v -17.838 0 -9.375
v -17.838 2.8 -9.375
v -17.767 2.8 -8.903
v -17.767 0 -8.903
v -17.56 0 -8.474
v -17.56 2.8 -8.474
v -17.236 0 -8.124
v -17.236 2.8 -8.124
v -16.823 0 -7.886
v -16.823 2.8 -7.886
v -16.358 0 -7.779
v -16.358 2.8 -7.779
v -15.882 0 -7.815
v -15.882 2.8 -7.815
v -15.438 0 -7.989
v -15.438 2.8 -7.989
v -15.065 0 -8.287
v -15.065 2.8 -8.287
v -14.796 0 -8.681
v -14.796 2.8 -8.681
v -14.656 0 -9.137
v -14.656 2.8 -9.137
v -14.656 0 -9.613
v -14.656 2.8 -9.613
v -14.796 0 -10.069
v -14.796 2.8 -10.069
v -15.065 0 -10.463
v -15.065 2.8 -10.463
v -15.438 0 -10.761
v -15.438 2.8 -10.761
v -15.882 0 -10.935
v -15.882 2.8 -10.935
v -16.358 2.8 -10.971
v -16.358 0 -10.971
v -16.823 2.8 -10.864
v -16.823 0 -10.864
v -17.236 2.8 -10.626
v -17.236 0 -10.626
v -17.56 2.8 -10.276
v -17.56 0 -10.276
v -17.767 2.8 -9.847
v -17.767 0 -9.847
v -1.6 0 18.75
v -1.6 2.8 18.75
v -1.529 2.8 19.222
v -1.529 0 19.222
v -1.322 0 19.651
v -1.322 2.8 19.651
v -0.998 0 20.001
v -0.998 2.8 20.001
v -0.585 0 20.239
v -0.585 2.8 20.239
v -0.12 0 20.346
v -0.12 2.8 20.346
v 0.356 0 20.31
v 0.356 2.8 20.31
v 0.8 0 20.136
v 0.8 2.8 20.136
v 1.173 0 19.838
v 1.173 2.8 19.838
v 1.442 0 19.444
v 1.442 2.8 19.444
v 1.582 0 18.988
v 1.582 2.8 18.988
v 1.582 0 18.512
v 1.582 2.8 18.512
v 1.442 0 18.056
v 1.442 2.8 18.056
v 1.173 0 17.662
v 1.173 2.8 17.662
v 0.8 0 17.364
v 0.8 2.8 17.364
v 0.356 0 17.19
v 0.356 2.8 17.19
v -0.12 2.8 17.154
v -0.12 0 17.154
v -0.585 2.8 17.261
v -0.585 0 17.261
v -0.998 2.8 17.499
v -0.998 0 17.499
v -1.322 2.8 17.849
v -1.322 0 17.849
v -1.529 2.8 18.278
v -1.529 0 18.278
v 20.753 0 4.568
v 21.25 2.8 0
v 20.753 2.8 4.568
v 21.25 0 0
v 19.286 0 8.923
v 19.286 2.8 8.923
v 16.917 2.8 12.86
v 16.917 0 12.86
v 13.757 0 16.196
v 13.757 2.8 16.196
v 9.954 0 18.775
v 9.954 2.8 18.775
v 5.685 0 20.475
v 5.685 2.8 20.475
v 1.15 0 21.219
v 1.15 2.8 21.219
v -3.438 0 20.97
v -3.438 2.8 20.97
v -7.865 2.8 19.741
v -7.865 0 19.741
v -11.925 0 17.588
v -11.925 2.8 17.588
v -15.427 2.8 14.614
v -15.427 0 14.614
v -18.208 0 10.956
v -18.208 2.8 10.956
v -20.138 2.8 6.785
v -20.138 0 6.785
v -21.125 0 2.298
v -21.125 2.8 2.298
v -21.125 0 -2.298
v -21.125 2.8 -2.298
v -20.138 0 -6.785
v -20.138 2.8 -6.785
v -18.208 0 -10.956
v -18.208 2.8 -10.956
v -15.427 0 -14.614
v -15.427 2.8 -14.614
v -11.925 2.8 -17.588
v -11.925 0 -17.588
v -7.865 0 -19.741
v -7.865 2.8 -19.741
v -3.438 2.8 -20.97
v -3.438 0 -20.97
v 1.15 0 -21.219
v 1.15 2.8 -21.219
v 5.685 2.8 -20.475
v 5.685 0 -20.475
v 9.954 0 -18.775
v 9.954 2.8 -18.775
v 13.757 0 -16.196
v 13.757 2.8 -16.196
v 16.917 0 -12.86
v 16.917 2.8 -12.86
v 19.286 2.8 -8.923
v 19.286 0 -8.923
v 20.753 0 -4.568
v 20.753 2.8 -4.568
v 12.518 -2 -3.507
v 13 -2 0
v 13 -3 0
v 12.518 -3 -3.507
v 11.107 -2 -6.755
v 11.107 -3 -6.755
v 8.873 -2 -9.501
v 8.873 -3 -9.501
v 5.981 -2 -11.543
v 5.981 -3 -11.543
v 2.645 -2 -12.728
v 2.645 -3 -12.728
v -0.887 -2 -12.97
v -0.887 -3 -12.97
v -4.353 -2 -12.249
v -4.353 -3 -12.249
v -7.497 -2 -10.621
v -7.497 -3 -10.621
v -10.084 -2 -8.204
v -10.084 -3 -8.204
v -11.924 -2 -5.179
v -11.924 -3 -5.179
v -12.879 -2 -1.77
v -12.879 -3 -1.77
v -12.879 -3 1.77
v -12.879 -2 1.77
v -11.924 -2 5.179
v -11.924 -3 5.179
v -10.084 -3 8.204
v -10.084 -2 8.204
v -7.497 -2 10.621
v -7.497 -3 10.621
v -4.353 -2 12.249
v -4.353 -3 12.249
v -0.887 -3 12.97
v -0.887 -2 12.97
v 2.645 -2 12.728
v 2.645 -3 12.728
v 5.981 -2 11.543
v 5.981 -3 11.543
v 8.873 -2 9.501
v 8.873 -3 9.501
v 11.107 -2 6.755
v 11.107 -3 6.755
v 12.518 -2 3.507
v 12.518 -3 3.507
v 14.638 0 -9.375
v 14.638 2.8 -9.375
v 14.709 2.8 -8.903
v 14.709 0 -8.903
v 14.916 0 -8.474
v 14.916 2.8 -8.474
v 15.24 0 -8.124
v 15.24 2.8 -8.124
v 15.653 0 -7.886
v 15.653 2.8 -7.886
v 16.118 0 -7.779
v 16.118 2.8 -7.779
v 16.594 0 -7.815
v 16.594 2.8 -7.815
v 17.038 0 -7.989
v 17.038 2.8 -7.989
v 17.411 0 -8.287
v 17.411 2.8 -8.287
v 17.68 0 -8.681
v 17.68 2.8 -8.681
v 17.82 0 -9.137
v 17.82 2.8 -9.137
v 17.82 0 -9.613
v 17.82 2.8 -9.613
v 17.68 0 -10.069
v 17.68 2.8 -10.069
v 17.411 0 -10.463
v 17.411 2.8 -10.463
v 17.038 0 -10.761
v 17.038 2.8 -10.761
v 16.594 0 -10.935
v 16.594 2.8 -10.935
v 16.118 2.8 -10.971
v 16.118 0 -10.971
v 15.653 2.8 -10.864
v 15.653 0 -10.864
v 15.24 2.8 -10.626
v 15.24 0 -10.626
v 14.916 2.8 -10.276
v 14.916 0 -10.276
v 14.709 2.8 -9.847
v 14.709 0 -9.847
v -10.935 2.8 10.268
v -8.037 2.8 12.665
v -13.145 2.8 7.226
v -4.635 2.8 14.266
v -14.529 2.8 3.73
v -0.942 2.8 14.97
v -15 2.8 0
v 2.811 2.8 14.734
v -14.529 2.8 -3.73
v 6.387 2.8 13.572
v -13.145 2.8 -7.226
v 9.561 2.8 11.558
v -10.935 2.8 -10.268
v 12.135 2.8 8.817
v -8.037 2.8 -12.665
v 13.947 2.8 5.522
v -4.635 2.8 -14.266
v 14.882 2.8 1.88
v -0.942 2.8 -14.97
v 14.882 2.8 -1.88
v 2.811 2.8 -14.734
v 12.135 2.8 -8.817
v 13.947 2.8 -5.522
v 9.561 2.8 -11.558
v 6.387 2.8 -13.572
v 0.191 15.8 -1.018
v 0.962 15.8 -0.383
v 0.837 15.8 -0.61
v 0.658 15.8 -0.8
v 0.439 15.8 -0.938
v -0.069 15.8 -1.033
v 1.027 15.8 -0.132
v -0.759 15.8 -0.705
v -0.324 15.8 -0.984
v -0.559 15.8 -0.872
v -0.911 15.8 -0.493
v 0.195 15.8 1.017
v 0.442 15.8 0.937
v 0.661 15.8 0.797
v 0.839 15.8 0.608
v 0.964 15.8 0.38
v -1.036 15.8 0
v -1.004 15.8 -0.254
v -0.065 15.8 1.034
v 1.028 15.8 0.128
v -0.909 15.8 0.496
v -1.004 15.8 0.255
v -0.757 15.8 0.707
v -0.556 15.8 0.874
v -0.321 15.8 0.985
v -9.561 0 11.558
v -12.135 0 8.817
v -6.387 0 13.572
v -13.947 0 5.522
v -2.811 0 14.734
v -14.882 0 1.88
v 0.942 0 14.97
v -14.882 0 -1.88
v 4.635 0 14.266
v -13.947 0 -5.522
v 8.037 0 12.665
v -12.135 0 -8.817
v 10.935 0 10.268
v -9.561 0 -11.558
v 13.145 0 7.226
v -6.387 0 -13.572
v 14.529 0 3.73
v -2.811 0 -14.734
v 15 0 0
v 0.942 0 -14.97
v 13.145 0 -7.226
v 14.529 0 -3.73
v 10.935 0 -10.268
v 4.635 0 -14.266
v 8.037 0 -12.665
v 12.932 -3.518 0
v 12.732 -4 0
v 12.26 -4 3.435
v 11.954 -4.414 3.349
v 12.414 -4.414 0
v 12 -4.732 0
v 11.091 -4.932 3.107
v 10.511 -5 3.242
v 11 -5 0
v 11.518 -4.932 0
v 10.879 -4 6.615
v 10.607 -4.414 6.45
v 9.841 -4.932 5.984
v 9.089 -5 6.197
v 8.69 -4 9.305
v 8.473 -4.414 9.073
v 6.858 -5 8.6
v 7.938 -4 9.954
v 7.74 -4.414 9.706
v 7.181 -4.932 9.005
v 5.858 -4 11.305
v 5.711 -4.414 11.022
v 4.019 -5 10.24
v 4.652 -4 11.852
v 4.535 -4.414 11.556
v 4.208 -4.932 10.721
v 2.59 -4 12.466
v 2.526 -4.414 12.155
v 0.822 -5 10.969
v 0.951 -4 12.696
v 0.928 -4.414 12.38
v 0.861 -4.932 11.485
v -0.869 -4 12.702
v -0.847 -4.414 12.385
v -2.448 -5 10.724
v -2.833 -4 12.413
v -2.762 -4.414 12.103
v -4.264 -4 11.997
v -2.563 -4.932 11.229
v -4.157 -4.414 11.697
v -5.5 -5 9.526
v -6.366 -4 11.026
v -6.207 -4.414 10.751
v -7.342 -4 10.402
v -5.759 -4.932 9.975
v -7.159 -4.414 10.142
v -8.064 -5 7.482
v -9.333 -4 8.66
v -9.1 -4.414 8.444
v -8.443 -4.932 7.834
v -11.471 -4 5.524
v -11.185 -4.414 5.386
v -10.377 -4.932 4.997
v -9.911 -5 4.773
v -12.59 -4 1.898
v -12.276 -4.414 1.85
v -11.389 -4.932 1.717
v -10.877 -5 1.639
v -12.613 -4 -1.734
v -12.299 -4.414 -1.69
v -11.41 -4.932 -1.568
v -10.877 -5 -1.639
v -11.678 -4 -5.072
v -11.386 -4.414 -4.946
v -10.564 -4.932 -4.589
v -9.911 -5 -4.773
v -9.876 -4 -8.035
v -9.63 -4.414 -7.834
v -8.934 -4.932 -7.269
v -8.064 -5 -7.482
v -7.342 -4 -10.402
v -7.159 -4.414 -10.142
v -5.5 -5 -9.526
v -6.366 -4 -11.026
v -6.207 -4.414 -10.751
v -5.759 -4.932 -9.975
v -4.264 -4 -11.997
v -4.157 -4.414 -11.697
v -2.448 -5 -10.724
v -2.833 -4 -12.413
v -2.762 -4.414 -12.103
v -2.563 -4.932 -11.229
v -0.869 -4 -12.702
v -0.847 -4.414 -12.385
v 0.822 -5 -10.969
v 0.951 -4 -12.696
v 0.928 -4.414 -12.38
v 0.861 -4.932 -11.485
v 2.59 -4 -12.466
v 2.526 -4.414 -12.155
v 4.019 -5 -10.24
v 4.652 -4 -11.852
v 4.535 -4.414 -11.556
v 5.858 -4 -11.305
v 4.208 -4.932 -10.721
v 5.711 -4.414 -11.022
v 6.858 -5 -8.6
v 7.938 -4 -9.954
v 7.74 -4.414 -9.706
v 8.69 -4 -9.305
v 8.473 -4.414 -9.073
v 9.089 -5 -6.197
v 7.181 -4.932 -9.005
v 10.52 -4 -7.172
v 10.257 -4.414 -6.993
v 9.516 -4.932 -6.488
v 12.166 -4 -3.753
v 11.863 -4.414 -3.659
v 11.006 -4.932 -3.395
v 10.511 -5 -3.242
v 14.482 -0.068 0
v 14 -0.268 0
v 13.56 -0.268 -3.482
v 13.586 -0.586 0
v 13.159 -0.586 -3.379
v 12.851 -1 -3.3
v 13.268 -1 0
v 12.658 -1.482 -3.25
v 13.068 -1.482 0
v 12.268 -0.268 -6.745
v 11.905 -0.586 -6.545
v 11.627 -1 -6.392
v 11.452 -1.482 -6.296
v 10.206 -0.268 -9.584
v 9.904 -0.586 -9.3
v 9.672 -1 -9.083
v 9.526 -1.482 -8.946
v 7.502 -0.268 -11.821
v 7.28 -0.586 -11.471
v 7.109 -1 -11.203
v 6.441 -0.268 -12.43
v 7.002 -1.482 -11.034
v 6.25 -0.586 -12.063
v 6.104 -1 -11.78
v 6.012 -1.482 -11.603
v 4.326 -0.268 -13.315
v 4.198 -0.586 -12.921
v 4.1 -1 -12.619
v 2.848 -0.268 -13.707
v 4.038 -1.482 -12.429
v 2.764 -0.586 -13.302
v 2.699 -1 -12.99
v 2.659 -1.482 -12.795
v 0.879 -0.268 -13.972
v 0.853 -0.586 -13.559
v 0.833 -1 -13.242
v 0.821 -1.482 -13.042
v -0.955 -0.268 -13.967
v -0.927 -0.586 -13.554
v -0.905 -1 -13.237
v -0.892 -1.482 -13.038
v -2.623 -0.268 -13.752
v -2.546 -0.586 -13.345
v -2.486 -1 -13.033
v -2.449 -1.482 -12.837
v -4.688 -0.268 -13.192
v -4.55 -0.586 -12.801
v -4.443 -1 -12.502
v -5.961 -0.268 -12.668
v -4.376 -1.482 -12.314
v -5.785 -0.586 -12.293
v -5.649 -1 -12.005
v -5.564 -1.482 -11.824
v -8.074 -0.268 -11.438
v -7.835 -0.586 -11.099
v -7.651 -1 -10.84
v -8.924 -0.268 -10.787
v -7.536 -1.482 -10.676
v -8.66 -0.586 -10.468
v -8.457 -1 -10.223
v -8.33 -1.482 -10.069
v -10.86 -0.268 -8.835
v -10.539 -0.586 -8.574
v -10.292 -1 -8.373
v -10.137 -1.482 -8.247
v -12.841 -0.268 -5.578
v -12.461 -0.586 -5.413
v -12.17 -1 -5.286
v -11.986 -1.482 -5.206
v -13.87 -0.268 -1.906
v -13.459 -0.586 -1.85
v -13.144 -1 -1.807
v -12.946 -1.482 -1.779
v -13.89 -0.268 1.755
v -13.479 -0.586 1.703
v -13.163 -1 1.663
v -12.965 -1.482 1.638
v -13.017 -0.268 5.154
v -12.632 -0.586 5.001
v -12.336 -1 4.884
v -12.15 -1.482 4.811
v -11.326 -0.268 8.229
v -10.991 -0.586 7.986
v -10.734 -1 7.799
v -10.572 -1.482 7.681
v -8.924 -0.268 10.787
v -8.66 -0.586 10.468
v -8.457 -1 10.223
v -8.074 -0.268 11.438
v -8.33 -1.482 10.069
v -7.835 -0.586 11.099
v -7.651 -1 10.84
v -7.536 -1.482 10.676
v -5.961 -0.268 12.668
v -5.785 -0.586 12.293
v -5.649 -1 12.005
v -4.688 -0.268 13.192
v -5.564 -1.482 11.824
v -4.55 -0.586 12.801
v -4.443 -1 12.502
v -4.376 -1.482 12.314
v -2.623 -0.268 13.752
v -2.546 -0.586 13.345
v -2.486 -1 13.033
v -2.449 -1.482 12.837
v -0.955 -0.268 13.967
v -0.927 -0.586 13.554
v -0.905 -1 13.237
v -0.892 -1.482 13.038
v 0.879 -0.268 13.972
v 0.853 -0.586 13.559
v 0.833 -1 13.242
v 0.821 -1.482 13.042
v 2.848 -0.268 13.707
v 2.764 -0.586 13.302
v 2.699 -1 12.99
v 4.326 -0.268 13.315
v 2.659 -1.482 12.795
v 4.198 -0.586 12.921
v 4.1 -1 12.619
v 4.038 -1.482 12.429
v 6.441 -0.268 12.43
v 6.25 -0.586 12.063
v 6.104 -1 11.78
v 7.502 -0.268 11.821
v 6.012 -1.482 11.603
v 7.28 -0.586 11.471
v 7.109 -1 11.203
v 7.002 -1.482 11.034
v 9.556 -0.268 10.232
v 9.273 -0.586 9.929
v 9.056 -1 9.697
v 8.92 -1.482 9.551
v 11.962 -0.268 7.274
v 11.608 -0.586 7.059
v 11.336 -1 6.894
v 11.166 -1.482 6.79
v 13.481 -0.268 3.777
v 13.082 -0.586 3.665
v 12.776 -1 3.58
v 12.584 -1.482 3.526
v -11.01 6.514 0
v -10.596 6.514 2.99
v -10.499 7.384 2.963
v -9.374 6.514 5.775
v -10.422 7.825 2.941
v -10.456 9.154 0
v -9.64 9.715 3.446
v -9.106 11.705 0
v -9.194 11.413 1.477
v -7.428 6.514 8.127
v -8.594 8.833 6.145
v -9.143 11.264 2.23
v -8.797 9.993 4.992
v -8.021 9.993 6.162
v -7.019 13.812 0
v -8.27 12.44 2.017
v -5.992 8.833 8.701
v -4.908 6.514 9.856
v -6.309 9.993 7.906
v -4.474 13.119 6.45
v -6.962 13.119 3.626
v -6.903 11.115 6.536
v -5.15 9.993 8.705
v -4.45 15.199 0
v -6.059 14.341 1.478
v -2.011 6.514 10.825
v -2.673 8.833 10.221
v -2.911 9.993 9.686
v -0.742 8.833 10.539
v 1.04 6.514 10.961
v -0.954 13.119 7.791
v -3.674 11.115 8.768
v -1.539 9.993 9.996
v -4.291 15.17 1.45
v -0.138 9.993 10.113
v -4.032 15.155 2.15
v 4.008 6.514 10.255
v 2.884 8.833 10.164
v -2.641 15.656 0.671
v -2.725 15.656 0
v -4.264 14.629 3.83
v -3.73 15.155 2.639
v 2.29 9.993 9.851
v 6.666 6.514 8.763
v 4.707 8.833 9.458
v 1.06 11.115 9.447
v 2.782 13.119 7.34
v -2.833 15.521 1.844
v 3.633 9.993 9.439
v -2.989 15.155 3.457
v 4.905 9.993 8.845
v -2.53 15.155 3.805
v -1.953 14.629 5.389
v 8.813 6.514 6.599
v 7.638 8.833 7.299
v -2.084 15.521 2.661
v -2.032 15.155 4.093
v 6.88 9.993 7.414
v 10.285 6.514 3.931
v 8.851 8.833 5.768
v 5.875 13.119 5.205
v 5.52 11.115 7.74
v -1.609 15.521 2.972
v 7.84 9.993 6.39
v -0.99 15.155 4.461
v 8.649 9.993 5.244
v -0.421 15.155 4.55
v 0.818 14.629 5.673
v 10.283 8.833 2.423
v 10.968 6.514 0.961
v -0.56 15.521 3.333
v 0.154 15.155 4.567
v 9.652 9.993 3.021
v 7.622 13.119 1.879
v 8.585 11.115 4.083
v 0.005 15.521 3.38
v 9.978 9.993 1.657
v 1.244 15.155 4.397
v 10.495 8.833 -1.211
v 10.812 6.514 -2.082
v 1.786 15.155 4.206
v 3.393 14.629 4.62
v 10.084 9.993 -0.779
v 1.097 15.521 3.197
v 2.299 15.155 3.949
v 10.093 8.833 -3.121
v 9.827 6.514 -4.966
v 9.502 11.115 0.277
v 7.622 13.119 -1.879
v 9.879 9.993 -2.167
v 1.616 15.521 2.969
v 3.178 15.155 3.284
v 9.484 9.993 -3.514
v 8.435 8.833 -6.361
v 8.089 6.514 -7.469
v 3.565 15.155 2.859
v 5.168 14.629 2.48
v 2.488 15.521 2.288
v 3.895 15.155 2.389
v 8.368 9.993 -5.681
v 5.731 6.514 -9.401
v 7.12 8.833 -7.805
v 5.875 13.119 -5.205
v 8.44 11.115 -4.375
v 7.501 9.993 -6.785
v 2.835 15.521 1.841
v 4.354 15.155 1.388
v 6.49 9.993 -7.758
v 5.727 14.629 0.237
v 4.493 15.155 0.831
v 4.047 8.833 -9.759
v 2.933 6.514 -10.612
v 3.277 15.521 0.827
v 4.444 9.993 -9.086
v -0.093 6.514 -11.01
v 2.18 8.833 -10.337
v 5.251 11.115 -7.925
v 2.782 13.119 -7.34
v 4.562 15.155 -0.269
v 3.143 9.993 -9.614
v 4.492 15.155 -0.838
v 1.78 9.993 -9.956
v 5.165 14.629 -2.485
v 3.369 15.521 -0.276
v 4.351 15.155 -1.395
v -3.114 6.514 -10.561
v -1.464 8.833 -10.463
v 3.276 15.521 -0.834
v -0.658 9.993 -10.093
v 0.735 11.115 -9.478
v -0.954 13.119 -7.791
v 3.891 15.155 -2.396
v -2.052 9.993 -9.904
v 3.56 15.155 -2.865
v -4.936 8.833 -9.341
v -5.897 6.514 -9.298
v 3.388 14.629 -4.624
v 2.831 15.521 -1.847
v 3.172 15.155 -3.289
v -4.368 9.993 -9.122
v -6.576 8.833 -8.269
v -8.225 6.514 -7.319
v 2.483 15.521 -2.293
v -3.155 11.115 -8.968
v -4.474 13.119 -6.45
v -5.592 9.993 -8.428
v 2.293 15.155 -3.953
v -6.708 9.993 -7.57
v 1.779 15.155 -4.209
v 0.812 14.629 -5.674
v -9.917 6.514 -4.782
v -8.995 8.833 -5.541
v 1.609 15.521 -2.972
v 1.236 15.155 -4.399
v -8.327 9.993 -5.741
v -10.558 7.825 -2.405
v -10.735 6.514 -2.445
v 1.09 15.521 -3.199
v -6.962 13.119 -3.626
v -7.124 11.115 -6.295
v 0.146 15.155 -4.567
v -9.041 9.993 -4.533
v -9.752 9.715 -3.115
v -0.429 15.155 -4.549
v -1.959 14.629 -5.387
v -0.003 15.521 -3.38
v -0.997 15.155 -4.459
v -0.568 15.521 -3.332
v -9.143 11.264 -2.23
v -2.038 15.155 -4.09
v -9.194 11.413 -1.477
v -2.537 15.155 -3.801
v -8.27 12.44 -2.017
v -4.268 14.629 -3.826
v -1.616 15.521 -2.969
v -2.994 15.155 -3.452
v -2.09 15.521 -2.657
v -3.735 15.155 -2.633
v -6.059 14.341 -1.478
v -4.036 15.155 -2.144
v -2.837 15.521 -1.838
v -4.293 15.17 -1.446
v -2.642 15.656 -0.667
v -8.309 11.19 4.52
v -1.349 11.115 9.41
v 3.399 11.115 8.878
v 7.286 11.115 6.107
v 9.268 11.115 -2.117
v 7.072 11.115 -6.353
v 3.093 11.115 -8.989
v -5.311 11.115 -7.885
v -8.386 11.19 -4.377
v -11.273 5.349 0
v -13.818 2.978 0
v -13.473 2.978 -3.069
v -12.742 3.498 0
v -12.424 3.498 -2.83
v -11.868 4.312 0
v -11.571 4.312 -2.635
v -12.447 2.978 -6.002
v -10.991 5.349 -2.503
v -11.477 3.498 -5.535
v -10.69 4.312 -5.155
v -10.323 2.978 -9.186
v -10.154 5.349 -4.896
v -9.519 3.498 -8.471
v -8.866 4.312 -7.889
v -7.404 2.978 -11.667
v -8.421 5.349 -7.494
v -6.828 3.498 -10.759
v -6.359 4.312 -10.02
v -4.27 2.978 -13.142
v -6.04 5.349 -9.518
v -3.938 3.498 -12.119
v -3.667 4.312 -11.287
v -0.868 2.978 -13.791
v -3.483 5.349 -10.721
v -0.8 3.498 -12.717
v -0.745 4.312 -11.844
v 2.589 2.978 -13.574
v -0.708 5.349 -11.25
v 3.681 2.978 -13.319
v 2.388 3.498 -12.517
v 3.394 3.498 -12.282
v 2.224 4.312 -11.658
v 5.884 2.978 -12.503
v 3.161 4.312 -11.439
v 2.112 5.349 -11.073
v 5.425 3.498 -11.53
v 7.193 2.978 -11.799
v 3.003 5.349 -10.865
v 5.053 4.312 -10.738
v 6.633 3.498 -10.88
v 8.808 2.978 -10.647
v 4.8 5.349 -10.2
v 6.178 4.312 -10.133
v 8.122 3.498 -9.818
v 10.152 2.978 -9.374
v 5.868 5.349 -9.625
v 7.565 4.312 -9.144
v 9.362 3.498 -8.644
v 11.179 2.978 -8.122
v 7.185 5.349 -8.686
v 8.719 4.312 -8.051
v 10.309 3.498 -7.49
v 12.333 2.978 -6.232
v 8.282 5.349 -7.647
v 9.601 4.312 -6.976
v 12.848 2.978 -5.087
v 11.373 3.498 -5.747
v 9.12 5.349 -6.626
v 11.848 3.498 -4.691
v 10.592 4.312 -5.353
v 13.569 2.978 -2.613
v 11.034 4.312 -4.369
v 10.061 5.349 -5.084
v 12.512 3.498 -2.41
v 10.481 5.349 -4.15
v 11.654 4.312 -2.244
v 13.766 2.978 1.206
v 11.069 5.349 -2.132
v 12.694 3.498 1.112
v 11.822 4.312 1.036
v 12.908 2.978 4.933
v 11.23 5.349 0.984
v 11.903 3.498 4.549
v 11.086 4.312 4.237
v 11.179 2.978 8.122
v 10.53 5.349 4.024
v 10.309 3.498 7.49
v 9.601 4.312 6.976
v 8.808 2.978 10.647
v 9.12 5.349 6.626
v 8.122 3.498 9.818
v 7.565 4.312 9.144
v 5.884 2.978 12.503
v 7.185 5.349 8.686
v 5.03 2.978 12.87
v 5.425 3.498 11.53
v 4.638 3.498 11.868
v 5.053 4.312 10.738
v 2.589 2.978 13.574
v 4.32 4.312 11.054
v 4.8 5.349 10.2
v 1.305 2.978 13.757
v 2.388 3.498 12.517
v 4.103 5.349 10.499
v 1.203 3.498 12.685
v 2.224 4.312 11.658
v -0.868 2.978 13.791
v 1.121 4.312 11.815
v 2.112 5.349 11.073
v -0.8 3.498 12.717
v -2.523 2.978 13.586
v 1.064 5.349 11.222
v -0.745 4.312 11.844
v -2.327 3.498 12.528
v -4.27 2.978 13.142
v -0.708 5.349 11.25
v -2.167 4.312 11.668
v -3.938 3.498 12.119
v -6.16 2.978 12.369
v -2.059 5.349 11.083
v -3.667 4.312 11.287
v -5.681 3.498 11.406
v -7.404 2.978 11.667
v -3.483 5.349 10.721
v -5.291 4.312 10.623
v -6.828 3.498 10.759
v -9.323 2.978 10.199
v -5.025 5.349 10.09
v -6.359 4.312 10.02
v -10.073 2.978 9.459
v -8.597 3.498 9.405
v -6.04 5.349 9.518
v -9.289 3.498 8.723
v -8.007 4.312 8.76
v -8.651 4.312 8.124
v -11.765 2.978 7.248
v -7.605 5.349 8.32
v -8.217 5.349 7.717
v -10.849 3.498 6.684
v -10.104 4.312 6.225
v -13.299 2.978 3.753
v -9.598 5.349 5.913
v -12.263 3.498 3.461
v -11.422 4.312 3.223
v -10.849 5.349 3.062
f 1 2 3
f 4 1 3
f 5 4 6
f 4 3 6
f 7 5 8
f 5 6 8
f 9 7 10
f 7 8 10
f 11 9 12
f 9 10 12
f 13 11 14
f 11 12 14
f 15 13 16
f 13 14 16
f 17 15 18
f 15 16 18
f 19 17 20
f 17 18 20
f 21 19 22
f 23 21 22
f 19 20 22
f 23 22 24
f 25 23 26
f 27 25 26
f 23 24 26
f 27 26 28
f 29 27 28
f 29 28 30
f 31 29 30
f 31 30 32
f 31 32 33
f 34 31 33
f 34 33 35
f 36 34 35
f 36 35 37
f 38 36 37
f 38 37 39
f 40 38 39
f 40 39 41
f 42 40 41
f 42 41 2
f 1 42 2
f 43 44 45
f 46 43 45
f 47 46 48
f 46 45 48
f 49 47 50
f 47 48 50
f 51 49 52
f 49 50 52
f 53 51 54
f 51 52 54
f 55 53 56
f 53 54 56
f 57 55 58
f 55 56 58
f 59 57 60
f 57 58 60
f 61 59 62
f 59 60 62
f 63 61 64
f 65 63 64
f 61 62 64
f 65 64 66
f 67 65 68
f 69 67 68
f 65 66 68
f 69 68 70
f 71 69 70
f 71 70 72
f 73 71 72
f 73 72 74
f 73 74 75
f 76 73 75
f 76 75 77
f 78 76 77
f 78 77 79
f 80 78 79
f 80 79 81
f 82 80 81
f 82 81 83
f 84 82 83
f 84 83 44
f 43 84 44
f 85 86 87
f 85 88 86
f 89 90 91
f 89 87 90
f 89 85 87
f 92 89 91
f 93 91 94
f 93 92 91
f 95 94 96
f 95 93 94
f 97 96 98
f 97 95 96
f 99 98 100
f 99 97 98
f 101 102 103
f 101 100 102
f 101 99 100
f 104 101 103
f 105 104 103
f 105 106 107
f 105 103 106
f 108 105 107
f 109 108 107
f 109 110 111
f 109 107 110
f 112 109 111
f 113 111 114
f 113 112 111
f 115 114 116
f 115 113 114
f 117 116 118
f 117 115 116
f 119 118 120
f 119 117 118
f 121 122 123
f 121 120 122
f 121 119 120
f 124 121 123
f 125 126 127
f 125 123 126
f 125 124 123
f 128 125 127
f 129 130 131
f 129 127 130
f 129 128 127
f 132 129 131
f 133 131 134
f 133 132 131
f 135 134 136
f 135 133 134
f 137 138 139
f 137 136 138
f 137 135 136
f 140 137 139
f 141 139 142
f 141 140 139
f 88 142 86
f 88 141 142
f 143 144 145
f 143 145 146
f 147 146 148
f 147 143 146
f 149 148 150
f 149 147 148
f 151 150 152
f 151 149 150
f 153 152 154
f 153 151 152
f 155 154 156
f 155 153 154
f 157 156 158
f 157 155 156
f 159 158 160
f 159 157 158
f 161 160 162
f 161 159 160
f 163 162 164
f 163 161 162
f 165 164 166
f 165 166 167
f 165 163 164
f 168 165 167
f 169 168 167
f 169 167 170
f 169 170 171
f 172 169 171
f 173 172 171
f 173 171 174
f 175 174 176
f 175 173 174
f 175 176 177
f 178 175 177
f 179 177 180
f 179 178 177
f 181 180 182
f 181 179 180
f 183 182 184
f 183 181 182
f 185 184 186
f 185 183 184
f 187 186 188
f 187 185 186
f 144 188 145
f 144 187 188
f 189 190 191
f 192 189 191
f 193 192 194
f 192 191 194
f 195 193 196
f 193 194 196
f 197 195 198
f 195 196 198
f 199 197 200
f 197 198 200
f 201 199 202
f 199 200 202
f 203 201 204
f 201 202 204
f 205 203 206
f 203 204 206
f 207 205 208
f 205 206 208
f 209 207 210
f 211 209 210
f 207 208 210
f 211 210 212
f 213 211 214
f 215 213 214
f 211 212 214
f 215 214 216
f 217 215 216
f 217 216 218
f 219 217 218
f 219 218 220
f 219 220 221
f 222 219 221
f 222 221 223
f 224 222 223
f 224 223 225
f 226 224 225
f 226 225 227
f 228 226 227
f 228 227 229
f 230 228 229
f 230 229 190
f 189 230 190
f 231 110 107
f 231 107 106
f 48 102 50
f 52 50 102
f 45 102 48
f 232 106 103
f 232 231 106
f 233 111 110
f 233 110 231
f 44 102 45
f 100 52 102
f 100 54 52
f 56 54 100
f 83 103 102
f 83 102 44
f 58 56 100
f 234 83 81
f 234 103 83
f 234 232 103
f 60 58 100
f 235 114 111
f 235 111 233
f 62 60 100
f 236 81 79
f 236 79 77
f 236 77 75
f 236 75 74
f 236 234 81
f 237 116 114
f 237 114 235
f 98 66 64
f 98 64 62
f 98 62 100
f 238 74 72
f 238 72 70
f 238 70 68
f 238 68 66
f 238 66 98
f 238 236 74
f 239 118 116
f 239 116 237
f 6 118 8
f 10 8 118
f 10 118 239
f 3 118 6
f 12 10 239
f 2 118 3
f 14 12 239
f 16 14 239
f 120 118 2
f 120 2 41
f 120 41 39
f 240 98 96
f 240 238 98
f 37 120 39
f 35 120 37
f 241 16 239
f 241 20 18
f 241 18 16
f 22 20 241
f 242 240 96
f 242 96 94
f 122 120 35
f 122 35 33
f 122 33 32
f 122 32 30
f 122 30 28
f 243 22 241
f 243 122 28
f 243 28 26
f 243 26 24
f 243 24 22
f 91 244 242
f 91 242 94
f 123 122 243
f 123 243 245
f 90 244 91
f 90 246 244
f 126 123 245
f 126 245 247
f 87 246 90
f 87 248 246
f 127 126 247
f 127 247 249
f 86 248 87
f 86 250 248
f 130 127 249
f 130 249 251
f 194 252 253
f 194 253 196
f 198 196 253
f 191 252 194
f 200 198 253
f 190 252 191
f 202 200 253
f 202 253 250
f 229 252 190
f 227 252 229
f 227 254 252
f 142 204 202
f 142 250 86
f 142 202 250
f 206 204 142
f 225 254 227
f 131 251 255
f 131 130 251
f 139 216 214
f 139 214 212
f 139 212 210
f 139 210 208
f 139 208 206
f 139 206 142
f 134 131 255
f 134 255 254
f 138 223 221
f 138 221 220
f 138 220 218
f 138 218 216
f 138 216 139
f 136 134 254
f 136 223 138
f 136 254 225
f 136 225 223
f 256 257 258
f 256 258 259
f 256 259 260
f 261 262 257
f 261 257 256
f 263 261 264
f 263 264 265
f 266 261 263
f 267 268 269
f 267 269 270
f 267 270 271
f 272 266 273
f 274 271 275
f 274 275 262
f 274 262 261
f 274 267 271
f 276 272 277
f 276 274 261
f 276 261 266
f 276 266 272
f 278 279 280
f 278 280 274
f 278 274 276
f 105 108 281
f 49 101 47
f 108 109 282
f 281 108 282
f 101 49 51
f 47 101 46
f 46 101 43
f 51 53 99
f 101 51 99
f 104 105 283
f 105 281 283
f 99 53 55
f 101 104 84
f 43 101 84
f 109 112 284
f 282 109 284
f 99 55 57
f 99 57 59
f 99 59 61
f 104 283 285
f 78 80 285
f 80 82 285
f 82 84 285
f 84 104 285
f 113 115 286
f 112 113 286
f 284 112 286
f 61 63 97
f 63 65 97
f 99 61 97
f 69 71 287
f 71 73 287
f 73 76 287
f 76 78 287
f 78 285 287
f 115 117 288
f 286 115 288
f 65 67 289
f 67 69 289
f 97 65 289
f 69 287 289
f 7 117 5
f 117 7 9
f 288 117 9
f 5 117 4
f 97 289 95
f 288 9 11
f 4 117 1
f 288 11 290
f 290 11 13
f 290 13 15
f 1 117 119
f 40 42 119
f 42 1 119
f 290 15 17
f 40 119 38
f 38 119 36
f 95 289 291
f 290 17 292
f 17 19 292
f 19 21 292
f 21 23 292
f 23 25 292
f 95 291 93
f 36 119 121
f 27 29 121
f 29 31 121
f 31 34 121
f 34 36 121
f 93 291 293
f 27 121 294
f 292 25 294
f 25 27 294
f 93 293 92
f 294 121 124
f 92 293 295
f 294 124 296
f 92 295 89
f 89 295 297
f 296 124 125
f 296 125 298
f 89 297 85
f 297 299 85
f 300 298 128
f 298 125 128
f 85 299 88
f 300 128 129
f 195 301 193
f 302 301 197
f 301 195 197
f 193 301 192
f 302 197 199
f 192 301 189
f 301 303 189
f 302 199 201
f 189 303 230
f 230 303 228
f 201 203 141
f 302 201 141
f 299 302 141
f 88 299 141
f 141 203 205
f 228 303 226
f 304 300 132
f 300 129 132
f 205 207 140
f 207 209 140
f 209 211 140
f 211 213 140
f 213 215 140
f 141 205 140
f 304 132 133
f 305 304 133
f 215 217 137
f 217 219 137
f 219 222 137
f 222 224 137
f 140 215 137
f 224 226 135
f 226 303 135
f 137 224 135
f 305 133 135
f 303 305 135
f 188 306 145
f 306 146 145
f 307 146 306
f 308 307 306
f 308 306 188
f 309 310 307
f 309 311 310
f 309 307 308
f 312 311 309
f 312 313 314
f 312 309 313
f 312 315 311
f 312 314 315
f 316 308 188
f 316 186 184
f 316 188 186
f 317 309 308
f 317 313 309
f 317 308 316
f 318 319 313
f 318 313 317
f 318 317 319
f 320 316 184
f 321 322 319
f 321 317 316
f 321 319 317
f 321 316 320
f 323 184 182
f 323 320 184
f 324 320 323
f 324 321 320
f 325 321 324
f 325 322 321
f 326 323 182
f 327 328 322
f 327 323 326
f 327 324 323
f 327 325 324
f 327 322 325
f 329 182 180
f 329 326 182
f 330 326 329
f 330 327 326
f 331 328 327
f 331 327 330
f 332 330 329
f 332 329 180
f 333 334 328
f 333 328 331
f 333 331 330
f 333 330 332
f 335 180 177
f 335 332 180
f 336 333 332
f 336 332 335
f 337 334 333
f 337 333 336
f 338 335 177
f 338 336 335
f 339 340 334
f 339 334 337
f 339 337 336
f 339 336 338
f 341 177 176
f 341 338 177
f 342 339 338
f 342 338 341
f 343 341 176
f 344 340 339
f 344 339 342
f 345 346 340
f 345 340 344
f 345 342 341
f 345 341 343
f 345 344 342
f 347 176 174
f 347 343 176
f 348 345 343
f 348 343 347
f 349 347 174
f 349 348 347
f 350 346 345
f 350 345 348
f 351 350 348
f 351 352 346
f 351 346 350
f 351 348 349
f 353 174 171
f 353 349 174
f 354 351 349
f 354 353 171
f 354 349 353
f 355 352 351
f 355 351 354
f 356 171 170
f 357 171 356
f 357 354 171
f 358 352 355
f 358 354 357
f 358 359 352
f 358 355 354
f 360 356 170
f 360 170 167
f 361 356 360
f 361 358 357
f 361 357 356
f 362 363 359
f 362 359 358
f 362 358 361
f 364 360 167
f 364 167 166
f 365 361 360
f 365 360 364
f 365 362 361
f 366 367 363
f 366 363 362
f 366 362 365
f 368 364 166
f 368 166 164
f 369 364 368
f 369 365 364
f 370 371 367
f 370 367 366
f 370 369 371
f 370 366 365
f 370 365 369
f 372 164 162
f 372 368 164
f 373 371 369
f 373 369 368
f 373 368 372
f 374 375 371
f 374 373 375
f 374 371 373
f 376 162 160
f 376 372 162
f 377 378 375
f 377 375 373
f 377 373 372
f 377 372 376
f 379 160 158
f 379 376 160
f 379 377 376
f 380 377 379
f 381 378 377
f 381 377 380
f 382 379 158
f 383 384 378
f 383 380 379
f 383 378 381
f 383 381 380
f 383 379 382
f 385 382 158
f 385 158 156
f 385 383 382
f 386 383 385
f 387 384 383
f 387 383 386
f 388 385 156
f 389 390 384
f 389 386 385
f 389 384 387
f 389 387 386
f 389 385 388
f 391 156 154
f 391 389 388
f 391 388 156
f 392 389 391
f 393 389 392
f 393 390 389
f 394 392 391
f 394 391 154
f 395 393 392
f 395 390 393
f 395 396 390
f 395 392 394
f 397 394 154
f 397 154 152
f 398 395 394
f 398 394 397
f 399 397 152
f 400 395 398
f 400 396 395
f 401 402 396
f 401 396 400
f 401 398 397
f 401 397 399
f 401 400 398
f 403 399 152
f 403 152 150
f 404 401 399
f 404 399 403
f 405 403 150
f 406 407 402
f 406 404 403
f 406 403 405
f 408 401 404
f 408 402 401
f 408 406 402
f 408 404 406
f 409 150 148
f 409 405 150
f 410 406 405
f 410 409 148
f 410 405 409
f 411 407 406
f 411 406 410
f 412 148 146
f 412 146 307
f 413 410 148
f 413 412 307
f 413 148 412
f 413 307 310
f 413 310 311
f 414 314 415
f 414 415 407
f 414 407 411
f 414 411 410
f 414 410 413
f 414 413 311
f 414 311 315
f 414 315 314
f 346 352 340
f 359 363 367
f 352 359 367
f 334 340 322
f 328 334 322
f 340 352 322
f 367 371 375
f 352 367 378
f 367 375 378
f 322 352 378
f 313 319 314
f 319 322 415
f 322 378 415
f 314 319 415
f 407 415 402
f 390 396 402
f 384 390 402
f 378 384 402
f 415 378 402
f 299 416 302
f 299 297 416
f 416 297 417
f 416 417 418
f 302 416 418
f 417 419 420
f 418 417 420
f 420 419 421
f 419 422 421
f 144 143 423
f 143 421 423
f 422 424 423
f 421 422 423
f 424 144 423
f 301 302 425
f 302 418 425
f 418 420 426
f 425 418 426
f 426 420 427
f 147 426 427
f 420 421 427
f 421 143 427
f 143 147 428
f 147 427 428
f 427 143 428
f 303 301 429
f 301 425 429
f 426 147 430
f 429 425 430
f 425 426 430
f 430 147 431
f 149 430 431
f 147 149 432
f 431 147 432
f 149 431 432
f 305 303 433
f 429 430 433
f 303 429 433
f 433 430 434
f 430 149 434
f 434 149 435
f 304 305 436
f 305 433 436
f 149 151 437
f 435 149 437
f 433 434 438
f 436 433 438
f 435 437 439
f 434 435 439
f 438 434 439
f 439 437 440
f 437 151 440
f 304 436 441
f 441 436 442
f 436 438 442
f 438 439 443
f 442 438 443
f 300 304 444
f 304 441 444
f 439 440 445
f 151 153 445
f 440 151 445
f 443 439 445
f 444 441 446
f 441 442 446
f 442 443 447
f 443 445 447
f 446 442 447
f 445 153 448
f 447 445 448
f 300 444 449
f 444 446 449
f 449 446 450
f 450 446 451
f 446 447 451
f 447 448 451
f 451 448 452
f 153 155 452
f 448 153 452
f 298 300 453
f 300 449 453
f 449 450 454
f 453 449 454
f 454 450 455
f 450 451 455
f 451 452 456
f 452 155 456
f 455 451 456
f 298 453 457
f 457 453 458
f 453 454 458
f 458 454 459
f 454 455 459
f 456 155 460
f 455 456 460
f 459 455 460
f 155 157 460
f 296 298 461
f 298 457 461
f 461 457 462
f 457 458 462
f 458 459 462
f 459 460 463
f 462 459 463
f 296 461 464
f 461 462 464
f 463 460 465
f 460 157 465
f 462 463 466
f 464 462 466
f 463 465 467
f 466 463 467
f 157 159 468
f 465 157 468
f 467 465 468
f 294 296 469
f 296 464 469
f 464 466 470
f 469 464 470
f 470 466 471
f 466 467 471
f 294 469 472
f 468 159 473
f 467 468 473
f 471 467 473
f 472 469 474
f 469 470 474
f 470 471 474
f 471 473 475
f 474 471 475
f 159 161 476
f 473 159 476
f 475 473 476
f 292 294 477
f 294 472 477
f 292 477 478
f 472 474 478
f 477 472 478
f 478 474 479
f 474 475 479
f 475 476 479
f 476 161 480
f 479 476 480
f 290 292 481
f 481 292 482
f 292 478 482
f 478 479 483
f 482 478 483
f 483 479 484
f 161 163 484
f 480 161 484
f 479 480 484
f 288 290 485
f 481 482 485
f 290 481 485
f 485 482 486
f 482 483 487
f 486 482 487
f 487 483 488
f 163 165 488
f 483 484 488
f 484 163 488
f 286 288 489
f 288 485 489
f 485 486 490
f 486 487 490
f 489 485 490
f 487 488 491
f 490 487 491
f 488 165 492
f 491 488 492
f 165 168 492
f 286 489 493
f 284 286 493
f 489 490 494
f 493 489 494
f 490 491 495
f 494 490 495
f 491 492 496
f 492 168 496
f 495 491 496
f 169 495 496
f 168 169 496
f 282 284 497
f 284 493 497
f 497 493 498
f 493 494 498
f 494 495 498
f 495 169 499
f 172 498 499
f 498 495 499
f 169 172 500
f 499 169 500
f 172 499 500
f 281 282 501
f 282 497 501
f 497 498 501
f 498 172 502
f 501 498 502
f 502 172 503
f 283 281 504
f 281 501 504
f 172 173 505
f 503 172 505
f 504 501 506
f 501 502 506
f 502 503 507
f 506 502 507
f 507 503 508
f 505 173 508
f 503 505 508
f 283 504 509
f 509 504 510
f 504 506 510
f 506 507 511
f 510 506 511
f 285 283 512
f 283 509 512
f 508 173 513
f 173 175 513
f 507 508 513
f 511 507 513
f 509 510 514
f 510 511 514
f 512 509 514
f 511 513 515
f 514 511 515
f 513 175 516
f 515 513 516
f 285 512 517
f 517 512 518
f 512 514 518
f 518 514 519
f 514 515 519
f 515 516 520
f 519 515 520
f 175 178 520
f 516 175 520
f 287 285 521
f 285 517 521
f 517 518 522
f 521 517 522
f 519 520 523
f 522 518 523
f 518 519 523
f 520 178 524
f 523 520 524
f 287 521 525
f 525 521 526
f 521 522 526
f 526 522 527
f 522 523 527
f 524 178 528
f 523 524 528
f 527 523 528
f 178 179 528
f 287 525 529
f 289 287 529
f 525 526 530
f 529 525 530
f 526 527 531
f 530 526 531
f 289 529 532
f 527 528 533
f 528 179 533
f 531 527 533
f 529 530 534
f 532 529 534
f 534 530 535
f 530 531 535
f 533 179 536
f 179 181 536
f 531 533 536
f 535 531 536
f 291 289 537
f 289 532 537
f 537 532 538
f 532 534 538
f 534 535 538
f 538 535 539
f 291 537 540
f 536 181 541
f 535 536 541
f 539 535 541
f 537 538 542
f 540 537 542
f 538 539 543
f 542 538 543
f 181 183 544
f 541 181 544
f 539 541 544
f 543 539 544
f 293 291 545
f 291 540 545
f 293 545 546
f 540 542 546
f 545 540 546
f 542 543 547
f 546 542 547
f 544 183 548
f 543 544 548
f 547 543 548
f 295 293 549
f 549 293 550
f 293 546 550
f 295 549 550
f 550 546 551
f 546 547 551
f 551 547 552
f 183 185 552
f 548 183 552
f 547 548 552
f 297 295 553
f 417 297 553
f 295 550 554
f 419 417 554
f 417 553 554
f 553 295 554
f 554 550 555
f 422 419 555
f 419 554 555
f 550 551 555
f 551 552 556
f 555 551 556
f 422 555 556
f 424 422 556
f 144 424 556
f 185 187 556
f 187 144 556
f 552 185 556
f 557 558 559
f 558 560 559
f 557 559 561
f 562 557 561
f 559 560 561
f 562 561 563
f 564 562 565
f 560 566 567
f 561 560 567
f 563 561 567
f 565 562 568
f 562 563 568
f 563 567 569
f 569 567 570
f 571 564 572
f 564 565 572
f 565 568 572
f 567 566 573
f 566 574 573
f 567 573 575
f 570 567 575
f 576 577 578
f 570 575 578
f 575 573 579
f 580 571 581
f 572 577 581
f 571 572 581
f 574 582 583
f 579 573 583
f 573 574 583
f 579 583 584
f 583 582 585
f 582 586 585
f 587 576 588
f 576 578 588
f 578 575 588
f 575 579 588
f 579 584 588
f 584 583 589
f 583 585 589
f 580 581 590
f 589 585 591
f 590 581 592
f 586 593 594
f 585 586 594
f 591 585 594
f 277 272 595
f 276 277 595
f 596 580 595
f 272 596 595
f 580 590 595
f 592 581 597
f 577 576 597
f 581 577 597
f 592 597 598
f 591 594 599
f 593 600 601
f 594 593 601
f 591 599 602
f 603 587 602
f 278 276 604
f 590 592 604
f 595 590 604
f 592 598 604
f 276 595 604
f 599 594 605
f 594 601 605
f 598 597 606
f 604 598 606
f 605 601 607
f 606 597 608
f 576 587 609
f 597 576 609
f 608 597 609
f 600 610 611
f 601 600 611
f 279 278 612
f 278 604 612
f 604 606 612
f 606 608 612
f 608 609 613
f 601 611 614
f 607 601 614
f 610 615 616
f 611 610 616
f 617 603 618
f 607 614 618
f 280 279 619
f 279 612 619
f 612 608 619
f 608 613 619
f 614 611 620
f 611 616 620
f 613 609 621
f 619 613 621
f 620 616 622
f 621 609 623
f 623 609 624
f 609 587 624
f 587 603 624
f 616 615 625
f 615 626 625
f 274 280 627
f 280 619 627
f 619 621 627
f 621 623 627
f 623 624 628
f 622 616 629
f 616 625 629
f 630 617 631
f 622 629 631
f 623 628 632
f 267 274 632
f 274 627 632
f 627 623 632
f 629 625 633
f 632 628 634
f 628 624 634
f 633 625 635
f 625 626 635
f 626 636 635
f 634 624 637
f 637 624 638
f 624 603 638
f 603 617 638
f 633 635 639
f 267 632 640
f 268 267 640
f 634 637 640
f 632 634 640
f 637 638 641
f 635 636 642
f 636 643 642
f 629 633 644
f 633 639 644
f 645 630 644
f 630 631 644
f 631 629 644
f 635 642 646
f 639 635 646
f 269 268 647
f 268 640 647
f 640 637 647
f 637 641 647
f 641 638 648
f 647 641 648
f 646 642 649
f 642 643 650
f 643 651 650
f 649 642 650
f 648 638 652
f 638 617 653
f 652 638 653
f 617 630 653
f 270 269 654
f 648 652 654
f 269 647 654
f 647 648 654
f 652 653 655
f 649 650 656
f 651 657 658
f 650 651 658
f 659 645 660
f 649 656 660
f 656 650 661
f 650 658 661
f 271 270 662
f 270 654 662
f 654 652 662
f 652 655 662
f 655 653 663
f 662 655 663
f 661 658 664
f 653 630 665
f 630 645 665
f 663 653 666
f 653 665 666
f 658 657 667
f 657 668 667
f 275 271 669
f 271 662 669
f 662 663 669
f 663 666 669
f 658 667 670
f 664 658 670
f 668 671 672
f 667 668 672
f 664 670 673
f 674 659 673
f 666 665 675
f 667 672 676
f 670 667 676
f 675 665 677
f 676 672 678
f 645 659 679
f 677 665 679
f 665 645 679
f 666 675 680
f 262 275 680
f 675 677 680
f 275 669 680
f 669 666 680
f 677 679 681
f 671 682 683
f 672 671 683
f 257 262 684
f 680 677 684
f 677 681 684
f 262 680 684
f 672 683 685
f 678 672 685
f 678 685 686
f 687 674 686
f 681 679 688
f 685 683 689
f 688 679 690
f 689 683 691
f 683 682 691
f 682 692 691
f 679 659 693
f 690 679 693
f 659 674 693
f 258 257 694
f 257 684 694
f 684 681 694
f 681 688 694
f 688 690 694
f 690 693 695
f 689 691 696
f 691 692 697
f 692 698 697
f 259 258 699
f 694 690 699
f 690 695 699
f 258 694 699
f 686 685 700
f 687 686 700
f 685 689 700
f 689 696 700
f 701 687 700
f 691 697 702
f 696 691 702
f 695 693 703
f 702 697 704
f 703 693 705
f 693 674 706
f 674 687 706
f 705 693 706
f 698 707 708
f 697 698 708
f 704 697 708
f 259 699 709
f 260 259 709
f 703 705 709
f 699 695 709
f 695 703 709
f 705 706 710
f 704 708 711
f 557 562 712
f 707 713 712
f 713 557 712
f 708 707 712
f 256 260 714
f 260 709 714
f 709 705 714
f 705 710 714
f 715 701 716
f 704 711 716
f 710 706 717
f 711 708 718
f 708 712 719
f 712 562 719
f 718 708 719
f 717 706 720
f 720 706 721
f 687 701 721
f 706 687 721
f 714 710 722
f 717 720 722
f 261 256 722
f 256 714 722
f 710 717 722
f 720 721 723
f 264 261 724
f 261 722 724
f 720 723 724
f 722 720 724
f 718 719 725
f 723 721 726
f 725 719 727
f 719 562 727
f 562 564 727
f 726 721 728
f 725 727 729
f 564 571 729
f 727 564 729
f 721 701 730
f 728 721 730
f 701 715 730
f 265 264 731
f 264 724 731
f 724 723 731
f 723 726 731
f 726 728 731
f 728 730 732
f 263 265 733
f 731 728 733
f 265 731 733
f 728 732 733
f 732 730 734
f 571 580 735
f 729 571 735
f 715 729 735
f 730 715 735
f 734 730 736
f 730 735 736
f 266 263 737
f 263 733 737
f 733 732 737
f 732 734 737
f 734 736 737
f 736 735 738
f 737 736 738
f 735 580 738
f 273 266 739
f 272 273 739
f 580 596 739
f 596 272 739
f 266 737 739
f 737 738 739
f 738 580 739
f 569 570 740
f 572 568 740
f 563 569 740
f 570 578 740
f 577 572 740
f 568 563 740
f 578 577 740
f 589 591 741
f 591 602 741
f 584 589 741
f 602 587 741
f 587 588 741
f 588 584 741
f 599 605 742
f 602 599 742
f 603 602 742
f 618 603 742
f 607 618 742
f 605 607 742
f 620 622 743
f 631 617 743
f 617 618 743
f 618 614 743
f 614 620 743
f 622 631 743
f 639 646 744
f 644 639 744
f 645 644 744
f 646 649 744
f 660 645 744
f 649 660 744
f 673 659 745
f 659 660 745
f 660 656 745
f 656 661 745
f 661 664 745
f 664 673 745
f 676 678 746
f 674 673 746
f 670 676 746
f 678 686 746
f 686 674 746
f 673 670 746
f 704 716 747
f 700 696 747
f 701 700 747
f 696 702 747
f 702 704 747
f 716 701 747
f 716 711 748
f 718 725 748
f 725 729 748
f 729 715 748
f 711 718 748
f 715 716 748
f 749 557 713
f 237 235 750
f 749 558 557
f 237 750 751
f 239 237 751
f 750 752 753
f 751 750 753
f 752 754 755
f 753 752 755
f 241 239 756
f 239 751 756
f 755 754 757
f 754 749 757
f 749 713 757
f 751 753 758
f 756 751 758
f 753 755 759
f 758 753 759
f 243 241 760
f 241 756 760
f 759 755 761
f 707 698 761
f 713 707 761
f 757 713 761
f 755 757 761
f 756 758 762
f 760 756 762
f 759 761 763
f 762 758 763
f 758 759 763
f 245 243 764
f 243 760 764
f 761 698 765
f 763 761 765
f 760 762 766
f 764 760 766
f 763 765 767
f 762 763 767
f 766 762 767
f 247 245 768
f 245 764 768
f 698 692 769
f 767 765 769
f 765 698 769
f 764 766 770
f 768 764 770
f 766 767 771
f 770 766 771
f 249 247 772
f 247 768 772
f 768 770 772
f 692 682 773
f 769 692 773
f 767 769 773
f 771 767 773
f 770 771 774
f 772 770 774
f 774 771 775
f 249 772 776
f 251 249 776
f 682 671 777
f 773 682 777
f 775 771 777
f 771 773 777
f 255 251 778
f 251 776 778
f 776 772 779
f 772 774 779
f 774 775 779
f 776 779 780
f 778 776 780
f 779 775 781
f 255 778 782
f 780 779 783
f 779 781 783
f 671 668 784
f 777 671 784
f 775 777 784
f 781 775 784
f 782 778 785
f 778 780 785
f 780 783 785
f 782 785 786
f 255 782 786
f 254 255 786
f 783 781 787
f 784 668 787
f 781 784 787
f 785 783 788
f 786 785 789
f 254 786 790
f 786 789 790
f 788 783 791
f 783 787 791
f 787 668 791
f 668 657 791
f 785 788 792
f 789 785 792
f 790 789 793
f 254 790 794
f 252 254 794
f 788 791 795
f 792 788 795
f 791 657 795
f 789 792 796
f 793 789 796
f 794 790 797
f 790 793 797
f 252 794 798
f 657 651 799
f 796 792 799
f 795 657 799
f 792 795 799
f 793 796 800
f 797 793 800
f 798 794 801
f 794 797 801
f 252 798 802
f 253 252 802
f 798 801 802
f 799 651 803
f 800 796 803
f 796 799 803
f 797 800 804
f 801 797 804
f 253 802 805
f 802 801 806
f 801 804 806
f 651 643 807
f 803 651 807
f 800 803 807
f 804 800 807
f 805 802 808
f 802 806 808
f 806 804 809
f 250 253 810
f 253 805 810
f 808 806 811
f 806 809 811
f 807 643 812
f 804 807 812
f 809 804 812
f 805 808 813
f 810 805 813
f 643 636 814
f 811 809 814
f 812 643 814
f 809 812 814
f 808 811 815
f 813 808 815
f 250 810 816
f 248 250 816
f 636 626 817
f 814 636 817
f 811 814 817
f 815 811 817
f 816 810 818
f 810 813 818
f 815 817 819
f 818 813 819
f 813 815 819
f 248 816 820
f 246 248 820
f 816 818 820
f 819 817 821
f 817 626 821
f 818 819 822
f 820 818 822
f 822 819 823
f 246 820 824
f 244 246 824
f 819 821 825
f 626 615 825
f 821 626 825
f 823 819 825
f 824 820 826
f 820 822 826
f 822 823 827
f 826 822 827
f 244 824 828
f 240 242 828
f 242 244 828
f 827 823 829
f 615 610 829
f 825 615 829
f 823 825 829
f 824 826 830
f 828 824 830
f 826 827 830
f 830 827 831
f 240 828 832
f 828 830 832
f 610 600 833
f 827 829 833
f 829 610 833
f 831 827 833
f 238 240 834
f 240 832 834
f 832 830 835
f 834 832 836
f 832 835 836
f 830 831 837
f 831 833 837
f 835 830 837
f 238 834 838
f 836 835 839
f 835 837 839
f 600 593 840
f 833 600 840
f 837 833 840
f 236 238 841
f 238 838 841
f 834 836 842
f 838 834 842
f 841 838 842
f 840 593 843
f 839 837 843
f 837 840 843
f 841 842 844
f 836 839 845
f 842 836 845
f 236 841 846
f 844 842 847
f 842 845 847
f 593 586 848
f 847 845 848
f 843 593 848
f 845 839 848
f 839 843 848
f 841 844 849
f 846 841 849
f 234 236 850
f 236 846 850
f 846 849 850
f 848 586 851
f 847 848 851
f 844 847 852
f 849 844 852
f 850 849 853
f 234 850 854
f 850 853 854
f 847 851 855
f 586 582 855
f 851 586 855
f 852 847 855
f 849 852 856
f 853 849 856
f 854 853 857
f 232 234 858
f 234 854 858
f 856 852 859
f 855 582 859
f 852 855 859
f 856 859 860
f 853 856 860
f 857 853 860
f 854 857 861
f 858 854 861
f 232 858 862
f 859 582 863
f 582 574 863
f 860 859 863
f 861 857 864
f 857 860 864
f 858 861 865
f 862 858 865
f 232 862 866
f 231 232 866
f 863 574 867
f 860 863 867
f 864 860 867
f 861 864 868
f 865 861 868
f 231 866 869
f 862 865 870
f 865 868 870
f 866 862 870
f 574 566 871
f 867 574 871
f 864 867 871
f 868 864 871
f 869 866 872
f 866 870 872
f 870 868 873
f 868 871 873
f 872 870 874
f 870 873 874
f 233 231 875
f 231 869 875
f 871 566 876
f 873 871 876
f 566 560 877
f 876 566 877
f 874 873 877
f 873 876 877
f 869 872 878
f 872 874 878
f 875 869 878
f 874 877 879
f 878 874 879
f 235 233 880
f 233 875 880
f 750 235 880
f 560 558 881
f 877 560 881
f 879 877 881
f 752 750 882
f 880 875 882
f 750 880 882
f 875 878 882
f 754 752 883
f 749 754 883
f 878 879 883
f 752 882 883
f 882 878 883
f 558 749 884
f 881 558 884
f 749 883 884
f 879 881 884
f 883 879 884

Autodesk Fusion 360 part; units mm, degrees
sketch "Sketch1" plane through (0, 0, 0) normal (0, 1, 0) x (1, 0, 0)
  circle A0 centre (0, 0) radius 13
  circle A1 centre (0, 0) radius 21.25
  dimension "d1" = 26
  dimension "d2" = 42.5
extrude "Extrude1" add sketch "Sketch1" against normal blind 5 contours A0
extrude "Extrude2" add sketch "Sketch1" along normal blind 2.8 contours A0 | A1
sketch "Sketch2" plane through (0, 2.8, 0) normal (0, 1, 0) x (-1, 0, 0)
  circle A0 centre (0, 0) radius 21.25
  circle A1 centre (0, 0) radius 11
  dimension "d7" = 22
extrude "Extrude3" add sketch "Sketch2" along normal blind 13 contours A1
fillet "Fillet1" radius 4 1 edges at (10.2556, 2.8, 3.9778)
fillet "Fillet2" radius 10 1 edges at (10.2556, 15.8, -3.9778)
fillet "Fillet3" radius 2 1 edges at (-12.1203, 0, 4.701)
fillet "Fillet4" radius 2 1 edges at (-12.1203, -5, -4.701)
sketch "Sketch3" plane through (0, 2.8, 0) normal (0, 1, 0) x (-1, 0, 0)
  circle A0 centre (0, 0) radius 21.25
  circle A1 centre (0, 0) radius 15
  circle A2 centre (0, 0) radius 18.75
  circle A3 centre (0, 18.75) radius 1.6
  circle A4 centre (-16.238, -9.375) radius 1.6
  circle A5 centre (16.238, -9.375) radius 1.6
  dimension "d18" = 37.5
  dimension "d19" = 3.2
  dimension "d21" = 360
extrude "Extrude4" cut sketch "Sketch3" against normal blind 5 contours A2 A3 | A2 A3 | A2 A5 | A2 A5 | A2 A4 | A2 A4
equation "d18 = 42.500 mm - 5 mm"
